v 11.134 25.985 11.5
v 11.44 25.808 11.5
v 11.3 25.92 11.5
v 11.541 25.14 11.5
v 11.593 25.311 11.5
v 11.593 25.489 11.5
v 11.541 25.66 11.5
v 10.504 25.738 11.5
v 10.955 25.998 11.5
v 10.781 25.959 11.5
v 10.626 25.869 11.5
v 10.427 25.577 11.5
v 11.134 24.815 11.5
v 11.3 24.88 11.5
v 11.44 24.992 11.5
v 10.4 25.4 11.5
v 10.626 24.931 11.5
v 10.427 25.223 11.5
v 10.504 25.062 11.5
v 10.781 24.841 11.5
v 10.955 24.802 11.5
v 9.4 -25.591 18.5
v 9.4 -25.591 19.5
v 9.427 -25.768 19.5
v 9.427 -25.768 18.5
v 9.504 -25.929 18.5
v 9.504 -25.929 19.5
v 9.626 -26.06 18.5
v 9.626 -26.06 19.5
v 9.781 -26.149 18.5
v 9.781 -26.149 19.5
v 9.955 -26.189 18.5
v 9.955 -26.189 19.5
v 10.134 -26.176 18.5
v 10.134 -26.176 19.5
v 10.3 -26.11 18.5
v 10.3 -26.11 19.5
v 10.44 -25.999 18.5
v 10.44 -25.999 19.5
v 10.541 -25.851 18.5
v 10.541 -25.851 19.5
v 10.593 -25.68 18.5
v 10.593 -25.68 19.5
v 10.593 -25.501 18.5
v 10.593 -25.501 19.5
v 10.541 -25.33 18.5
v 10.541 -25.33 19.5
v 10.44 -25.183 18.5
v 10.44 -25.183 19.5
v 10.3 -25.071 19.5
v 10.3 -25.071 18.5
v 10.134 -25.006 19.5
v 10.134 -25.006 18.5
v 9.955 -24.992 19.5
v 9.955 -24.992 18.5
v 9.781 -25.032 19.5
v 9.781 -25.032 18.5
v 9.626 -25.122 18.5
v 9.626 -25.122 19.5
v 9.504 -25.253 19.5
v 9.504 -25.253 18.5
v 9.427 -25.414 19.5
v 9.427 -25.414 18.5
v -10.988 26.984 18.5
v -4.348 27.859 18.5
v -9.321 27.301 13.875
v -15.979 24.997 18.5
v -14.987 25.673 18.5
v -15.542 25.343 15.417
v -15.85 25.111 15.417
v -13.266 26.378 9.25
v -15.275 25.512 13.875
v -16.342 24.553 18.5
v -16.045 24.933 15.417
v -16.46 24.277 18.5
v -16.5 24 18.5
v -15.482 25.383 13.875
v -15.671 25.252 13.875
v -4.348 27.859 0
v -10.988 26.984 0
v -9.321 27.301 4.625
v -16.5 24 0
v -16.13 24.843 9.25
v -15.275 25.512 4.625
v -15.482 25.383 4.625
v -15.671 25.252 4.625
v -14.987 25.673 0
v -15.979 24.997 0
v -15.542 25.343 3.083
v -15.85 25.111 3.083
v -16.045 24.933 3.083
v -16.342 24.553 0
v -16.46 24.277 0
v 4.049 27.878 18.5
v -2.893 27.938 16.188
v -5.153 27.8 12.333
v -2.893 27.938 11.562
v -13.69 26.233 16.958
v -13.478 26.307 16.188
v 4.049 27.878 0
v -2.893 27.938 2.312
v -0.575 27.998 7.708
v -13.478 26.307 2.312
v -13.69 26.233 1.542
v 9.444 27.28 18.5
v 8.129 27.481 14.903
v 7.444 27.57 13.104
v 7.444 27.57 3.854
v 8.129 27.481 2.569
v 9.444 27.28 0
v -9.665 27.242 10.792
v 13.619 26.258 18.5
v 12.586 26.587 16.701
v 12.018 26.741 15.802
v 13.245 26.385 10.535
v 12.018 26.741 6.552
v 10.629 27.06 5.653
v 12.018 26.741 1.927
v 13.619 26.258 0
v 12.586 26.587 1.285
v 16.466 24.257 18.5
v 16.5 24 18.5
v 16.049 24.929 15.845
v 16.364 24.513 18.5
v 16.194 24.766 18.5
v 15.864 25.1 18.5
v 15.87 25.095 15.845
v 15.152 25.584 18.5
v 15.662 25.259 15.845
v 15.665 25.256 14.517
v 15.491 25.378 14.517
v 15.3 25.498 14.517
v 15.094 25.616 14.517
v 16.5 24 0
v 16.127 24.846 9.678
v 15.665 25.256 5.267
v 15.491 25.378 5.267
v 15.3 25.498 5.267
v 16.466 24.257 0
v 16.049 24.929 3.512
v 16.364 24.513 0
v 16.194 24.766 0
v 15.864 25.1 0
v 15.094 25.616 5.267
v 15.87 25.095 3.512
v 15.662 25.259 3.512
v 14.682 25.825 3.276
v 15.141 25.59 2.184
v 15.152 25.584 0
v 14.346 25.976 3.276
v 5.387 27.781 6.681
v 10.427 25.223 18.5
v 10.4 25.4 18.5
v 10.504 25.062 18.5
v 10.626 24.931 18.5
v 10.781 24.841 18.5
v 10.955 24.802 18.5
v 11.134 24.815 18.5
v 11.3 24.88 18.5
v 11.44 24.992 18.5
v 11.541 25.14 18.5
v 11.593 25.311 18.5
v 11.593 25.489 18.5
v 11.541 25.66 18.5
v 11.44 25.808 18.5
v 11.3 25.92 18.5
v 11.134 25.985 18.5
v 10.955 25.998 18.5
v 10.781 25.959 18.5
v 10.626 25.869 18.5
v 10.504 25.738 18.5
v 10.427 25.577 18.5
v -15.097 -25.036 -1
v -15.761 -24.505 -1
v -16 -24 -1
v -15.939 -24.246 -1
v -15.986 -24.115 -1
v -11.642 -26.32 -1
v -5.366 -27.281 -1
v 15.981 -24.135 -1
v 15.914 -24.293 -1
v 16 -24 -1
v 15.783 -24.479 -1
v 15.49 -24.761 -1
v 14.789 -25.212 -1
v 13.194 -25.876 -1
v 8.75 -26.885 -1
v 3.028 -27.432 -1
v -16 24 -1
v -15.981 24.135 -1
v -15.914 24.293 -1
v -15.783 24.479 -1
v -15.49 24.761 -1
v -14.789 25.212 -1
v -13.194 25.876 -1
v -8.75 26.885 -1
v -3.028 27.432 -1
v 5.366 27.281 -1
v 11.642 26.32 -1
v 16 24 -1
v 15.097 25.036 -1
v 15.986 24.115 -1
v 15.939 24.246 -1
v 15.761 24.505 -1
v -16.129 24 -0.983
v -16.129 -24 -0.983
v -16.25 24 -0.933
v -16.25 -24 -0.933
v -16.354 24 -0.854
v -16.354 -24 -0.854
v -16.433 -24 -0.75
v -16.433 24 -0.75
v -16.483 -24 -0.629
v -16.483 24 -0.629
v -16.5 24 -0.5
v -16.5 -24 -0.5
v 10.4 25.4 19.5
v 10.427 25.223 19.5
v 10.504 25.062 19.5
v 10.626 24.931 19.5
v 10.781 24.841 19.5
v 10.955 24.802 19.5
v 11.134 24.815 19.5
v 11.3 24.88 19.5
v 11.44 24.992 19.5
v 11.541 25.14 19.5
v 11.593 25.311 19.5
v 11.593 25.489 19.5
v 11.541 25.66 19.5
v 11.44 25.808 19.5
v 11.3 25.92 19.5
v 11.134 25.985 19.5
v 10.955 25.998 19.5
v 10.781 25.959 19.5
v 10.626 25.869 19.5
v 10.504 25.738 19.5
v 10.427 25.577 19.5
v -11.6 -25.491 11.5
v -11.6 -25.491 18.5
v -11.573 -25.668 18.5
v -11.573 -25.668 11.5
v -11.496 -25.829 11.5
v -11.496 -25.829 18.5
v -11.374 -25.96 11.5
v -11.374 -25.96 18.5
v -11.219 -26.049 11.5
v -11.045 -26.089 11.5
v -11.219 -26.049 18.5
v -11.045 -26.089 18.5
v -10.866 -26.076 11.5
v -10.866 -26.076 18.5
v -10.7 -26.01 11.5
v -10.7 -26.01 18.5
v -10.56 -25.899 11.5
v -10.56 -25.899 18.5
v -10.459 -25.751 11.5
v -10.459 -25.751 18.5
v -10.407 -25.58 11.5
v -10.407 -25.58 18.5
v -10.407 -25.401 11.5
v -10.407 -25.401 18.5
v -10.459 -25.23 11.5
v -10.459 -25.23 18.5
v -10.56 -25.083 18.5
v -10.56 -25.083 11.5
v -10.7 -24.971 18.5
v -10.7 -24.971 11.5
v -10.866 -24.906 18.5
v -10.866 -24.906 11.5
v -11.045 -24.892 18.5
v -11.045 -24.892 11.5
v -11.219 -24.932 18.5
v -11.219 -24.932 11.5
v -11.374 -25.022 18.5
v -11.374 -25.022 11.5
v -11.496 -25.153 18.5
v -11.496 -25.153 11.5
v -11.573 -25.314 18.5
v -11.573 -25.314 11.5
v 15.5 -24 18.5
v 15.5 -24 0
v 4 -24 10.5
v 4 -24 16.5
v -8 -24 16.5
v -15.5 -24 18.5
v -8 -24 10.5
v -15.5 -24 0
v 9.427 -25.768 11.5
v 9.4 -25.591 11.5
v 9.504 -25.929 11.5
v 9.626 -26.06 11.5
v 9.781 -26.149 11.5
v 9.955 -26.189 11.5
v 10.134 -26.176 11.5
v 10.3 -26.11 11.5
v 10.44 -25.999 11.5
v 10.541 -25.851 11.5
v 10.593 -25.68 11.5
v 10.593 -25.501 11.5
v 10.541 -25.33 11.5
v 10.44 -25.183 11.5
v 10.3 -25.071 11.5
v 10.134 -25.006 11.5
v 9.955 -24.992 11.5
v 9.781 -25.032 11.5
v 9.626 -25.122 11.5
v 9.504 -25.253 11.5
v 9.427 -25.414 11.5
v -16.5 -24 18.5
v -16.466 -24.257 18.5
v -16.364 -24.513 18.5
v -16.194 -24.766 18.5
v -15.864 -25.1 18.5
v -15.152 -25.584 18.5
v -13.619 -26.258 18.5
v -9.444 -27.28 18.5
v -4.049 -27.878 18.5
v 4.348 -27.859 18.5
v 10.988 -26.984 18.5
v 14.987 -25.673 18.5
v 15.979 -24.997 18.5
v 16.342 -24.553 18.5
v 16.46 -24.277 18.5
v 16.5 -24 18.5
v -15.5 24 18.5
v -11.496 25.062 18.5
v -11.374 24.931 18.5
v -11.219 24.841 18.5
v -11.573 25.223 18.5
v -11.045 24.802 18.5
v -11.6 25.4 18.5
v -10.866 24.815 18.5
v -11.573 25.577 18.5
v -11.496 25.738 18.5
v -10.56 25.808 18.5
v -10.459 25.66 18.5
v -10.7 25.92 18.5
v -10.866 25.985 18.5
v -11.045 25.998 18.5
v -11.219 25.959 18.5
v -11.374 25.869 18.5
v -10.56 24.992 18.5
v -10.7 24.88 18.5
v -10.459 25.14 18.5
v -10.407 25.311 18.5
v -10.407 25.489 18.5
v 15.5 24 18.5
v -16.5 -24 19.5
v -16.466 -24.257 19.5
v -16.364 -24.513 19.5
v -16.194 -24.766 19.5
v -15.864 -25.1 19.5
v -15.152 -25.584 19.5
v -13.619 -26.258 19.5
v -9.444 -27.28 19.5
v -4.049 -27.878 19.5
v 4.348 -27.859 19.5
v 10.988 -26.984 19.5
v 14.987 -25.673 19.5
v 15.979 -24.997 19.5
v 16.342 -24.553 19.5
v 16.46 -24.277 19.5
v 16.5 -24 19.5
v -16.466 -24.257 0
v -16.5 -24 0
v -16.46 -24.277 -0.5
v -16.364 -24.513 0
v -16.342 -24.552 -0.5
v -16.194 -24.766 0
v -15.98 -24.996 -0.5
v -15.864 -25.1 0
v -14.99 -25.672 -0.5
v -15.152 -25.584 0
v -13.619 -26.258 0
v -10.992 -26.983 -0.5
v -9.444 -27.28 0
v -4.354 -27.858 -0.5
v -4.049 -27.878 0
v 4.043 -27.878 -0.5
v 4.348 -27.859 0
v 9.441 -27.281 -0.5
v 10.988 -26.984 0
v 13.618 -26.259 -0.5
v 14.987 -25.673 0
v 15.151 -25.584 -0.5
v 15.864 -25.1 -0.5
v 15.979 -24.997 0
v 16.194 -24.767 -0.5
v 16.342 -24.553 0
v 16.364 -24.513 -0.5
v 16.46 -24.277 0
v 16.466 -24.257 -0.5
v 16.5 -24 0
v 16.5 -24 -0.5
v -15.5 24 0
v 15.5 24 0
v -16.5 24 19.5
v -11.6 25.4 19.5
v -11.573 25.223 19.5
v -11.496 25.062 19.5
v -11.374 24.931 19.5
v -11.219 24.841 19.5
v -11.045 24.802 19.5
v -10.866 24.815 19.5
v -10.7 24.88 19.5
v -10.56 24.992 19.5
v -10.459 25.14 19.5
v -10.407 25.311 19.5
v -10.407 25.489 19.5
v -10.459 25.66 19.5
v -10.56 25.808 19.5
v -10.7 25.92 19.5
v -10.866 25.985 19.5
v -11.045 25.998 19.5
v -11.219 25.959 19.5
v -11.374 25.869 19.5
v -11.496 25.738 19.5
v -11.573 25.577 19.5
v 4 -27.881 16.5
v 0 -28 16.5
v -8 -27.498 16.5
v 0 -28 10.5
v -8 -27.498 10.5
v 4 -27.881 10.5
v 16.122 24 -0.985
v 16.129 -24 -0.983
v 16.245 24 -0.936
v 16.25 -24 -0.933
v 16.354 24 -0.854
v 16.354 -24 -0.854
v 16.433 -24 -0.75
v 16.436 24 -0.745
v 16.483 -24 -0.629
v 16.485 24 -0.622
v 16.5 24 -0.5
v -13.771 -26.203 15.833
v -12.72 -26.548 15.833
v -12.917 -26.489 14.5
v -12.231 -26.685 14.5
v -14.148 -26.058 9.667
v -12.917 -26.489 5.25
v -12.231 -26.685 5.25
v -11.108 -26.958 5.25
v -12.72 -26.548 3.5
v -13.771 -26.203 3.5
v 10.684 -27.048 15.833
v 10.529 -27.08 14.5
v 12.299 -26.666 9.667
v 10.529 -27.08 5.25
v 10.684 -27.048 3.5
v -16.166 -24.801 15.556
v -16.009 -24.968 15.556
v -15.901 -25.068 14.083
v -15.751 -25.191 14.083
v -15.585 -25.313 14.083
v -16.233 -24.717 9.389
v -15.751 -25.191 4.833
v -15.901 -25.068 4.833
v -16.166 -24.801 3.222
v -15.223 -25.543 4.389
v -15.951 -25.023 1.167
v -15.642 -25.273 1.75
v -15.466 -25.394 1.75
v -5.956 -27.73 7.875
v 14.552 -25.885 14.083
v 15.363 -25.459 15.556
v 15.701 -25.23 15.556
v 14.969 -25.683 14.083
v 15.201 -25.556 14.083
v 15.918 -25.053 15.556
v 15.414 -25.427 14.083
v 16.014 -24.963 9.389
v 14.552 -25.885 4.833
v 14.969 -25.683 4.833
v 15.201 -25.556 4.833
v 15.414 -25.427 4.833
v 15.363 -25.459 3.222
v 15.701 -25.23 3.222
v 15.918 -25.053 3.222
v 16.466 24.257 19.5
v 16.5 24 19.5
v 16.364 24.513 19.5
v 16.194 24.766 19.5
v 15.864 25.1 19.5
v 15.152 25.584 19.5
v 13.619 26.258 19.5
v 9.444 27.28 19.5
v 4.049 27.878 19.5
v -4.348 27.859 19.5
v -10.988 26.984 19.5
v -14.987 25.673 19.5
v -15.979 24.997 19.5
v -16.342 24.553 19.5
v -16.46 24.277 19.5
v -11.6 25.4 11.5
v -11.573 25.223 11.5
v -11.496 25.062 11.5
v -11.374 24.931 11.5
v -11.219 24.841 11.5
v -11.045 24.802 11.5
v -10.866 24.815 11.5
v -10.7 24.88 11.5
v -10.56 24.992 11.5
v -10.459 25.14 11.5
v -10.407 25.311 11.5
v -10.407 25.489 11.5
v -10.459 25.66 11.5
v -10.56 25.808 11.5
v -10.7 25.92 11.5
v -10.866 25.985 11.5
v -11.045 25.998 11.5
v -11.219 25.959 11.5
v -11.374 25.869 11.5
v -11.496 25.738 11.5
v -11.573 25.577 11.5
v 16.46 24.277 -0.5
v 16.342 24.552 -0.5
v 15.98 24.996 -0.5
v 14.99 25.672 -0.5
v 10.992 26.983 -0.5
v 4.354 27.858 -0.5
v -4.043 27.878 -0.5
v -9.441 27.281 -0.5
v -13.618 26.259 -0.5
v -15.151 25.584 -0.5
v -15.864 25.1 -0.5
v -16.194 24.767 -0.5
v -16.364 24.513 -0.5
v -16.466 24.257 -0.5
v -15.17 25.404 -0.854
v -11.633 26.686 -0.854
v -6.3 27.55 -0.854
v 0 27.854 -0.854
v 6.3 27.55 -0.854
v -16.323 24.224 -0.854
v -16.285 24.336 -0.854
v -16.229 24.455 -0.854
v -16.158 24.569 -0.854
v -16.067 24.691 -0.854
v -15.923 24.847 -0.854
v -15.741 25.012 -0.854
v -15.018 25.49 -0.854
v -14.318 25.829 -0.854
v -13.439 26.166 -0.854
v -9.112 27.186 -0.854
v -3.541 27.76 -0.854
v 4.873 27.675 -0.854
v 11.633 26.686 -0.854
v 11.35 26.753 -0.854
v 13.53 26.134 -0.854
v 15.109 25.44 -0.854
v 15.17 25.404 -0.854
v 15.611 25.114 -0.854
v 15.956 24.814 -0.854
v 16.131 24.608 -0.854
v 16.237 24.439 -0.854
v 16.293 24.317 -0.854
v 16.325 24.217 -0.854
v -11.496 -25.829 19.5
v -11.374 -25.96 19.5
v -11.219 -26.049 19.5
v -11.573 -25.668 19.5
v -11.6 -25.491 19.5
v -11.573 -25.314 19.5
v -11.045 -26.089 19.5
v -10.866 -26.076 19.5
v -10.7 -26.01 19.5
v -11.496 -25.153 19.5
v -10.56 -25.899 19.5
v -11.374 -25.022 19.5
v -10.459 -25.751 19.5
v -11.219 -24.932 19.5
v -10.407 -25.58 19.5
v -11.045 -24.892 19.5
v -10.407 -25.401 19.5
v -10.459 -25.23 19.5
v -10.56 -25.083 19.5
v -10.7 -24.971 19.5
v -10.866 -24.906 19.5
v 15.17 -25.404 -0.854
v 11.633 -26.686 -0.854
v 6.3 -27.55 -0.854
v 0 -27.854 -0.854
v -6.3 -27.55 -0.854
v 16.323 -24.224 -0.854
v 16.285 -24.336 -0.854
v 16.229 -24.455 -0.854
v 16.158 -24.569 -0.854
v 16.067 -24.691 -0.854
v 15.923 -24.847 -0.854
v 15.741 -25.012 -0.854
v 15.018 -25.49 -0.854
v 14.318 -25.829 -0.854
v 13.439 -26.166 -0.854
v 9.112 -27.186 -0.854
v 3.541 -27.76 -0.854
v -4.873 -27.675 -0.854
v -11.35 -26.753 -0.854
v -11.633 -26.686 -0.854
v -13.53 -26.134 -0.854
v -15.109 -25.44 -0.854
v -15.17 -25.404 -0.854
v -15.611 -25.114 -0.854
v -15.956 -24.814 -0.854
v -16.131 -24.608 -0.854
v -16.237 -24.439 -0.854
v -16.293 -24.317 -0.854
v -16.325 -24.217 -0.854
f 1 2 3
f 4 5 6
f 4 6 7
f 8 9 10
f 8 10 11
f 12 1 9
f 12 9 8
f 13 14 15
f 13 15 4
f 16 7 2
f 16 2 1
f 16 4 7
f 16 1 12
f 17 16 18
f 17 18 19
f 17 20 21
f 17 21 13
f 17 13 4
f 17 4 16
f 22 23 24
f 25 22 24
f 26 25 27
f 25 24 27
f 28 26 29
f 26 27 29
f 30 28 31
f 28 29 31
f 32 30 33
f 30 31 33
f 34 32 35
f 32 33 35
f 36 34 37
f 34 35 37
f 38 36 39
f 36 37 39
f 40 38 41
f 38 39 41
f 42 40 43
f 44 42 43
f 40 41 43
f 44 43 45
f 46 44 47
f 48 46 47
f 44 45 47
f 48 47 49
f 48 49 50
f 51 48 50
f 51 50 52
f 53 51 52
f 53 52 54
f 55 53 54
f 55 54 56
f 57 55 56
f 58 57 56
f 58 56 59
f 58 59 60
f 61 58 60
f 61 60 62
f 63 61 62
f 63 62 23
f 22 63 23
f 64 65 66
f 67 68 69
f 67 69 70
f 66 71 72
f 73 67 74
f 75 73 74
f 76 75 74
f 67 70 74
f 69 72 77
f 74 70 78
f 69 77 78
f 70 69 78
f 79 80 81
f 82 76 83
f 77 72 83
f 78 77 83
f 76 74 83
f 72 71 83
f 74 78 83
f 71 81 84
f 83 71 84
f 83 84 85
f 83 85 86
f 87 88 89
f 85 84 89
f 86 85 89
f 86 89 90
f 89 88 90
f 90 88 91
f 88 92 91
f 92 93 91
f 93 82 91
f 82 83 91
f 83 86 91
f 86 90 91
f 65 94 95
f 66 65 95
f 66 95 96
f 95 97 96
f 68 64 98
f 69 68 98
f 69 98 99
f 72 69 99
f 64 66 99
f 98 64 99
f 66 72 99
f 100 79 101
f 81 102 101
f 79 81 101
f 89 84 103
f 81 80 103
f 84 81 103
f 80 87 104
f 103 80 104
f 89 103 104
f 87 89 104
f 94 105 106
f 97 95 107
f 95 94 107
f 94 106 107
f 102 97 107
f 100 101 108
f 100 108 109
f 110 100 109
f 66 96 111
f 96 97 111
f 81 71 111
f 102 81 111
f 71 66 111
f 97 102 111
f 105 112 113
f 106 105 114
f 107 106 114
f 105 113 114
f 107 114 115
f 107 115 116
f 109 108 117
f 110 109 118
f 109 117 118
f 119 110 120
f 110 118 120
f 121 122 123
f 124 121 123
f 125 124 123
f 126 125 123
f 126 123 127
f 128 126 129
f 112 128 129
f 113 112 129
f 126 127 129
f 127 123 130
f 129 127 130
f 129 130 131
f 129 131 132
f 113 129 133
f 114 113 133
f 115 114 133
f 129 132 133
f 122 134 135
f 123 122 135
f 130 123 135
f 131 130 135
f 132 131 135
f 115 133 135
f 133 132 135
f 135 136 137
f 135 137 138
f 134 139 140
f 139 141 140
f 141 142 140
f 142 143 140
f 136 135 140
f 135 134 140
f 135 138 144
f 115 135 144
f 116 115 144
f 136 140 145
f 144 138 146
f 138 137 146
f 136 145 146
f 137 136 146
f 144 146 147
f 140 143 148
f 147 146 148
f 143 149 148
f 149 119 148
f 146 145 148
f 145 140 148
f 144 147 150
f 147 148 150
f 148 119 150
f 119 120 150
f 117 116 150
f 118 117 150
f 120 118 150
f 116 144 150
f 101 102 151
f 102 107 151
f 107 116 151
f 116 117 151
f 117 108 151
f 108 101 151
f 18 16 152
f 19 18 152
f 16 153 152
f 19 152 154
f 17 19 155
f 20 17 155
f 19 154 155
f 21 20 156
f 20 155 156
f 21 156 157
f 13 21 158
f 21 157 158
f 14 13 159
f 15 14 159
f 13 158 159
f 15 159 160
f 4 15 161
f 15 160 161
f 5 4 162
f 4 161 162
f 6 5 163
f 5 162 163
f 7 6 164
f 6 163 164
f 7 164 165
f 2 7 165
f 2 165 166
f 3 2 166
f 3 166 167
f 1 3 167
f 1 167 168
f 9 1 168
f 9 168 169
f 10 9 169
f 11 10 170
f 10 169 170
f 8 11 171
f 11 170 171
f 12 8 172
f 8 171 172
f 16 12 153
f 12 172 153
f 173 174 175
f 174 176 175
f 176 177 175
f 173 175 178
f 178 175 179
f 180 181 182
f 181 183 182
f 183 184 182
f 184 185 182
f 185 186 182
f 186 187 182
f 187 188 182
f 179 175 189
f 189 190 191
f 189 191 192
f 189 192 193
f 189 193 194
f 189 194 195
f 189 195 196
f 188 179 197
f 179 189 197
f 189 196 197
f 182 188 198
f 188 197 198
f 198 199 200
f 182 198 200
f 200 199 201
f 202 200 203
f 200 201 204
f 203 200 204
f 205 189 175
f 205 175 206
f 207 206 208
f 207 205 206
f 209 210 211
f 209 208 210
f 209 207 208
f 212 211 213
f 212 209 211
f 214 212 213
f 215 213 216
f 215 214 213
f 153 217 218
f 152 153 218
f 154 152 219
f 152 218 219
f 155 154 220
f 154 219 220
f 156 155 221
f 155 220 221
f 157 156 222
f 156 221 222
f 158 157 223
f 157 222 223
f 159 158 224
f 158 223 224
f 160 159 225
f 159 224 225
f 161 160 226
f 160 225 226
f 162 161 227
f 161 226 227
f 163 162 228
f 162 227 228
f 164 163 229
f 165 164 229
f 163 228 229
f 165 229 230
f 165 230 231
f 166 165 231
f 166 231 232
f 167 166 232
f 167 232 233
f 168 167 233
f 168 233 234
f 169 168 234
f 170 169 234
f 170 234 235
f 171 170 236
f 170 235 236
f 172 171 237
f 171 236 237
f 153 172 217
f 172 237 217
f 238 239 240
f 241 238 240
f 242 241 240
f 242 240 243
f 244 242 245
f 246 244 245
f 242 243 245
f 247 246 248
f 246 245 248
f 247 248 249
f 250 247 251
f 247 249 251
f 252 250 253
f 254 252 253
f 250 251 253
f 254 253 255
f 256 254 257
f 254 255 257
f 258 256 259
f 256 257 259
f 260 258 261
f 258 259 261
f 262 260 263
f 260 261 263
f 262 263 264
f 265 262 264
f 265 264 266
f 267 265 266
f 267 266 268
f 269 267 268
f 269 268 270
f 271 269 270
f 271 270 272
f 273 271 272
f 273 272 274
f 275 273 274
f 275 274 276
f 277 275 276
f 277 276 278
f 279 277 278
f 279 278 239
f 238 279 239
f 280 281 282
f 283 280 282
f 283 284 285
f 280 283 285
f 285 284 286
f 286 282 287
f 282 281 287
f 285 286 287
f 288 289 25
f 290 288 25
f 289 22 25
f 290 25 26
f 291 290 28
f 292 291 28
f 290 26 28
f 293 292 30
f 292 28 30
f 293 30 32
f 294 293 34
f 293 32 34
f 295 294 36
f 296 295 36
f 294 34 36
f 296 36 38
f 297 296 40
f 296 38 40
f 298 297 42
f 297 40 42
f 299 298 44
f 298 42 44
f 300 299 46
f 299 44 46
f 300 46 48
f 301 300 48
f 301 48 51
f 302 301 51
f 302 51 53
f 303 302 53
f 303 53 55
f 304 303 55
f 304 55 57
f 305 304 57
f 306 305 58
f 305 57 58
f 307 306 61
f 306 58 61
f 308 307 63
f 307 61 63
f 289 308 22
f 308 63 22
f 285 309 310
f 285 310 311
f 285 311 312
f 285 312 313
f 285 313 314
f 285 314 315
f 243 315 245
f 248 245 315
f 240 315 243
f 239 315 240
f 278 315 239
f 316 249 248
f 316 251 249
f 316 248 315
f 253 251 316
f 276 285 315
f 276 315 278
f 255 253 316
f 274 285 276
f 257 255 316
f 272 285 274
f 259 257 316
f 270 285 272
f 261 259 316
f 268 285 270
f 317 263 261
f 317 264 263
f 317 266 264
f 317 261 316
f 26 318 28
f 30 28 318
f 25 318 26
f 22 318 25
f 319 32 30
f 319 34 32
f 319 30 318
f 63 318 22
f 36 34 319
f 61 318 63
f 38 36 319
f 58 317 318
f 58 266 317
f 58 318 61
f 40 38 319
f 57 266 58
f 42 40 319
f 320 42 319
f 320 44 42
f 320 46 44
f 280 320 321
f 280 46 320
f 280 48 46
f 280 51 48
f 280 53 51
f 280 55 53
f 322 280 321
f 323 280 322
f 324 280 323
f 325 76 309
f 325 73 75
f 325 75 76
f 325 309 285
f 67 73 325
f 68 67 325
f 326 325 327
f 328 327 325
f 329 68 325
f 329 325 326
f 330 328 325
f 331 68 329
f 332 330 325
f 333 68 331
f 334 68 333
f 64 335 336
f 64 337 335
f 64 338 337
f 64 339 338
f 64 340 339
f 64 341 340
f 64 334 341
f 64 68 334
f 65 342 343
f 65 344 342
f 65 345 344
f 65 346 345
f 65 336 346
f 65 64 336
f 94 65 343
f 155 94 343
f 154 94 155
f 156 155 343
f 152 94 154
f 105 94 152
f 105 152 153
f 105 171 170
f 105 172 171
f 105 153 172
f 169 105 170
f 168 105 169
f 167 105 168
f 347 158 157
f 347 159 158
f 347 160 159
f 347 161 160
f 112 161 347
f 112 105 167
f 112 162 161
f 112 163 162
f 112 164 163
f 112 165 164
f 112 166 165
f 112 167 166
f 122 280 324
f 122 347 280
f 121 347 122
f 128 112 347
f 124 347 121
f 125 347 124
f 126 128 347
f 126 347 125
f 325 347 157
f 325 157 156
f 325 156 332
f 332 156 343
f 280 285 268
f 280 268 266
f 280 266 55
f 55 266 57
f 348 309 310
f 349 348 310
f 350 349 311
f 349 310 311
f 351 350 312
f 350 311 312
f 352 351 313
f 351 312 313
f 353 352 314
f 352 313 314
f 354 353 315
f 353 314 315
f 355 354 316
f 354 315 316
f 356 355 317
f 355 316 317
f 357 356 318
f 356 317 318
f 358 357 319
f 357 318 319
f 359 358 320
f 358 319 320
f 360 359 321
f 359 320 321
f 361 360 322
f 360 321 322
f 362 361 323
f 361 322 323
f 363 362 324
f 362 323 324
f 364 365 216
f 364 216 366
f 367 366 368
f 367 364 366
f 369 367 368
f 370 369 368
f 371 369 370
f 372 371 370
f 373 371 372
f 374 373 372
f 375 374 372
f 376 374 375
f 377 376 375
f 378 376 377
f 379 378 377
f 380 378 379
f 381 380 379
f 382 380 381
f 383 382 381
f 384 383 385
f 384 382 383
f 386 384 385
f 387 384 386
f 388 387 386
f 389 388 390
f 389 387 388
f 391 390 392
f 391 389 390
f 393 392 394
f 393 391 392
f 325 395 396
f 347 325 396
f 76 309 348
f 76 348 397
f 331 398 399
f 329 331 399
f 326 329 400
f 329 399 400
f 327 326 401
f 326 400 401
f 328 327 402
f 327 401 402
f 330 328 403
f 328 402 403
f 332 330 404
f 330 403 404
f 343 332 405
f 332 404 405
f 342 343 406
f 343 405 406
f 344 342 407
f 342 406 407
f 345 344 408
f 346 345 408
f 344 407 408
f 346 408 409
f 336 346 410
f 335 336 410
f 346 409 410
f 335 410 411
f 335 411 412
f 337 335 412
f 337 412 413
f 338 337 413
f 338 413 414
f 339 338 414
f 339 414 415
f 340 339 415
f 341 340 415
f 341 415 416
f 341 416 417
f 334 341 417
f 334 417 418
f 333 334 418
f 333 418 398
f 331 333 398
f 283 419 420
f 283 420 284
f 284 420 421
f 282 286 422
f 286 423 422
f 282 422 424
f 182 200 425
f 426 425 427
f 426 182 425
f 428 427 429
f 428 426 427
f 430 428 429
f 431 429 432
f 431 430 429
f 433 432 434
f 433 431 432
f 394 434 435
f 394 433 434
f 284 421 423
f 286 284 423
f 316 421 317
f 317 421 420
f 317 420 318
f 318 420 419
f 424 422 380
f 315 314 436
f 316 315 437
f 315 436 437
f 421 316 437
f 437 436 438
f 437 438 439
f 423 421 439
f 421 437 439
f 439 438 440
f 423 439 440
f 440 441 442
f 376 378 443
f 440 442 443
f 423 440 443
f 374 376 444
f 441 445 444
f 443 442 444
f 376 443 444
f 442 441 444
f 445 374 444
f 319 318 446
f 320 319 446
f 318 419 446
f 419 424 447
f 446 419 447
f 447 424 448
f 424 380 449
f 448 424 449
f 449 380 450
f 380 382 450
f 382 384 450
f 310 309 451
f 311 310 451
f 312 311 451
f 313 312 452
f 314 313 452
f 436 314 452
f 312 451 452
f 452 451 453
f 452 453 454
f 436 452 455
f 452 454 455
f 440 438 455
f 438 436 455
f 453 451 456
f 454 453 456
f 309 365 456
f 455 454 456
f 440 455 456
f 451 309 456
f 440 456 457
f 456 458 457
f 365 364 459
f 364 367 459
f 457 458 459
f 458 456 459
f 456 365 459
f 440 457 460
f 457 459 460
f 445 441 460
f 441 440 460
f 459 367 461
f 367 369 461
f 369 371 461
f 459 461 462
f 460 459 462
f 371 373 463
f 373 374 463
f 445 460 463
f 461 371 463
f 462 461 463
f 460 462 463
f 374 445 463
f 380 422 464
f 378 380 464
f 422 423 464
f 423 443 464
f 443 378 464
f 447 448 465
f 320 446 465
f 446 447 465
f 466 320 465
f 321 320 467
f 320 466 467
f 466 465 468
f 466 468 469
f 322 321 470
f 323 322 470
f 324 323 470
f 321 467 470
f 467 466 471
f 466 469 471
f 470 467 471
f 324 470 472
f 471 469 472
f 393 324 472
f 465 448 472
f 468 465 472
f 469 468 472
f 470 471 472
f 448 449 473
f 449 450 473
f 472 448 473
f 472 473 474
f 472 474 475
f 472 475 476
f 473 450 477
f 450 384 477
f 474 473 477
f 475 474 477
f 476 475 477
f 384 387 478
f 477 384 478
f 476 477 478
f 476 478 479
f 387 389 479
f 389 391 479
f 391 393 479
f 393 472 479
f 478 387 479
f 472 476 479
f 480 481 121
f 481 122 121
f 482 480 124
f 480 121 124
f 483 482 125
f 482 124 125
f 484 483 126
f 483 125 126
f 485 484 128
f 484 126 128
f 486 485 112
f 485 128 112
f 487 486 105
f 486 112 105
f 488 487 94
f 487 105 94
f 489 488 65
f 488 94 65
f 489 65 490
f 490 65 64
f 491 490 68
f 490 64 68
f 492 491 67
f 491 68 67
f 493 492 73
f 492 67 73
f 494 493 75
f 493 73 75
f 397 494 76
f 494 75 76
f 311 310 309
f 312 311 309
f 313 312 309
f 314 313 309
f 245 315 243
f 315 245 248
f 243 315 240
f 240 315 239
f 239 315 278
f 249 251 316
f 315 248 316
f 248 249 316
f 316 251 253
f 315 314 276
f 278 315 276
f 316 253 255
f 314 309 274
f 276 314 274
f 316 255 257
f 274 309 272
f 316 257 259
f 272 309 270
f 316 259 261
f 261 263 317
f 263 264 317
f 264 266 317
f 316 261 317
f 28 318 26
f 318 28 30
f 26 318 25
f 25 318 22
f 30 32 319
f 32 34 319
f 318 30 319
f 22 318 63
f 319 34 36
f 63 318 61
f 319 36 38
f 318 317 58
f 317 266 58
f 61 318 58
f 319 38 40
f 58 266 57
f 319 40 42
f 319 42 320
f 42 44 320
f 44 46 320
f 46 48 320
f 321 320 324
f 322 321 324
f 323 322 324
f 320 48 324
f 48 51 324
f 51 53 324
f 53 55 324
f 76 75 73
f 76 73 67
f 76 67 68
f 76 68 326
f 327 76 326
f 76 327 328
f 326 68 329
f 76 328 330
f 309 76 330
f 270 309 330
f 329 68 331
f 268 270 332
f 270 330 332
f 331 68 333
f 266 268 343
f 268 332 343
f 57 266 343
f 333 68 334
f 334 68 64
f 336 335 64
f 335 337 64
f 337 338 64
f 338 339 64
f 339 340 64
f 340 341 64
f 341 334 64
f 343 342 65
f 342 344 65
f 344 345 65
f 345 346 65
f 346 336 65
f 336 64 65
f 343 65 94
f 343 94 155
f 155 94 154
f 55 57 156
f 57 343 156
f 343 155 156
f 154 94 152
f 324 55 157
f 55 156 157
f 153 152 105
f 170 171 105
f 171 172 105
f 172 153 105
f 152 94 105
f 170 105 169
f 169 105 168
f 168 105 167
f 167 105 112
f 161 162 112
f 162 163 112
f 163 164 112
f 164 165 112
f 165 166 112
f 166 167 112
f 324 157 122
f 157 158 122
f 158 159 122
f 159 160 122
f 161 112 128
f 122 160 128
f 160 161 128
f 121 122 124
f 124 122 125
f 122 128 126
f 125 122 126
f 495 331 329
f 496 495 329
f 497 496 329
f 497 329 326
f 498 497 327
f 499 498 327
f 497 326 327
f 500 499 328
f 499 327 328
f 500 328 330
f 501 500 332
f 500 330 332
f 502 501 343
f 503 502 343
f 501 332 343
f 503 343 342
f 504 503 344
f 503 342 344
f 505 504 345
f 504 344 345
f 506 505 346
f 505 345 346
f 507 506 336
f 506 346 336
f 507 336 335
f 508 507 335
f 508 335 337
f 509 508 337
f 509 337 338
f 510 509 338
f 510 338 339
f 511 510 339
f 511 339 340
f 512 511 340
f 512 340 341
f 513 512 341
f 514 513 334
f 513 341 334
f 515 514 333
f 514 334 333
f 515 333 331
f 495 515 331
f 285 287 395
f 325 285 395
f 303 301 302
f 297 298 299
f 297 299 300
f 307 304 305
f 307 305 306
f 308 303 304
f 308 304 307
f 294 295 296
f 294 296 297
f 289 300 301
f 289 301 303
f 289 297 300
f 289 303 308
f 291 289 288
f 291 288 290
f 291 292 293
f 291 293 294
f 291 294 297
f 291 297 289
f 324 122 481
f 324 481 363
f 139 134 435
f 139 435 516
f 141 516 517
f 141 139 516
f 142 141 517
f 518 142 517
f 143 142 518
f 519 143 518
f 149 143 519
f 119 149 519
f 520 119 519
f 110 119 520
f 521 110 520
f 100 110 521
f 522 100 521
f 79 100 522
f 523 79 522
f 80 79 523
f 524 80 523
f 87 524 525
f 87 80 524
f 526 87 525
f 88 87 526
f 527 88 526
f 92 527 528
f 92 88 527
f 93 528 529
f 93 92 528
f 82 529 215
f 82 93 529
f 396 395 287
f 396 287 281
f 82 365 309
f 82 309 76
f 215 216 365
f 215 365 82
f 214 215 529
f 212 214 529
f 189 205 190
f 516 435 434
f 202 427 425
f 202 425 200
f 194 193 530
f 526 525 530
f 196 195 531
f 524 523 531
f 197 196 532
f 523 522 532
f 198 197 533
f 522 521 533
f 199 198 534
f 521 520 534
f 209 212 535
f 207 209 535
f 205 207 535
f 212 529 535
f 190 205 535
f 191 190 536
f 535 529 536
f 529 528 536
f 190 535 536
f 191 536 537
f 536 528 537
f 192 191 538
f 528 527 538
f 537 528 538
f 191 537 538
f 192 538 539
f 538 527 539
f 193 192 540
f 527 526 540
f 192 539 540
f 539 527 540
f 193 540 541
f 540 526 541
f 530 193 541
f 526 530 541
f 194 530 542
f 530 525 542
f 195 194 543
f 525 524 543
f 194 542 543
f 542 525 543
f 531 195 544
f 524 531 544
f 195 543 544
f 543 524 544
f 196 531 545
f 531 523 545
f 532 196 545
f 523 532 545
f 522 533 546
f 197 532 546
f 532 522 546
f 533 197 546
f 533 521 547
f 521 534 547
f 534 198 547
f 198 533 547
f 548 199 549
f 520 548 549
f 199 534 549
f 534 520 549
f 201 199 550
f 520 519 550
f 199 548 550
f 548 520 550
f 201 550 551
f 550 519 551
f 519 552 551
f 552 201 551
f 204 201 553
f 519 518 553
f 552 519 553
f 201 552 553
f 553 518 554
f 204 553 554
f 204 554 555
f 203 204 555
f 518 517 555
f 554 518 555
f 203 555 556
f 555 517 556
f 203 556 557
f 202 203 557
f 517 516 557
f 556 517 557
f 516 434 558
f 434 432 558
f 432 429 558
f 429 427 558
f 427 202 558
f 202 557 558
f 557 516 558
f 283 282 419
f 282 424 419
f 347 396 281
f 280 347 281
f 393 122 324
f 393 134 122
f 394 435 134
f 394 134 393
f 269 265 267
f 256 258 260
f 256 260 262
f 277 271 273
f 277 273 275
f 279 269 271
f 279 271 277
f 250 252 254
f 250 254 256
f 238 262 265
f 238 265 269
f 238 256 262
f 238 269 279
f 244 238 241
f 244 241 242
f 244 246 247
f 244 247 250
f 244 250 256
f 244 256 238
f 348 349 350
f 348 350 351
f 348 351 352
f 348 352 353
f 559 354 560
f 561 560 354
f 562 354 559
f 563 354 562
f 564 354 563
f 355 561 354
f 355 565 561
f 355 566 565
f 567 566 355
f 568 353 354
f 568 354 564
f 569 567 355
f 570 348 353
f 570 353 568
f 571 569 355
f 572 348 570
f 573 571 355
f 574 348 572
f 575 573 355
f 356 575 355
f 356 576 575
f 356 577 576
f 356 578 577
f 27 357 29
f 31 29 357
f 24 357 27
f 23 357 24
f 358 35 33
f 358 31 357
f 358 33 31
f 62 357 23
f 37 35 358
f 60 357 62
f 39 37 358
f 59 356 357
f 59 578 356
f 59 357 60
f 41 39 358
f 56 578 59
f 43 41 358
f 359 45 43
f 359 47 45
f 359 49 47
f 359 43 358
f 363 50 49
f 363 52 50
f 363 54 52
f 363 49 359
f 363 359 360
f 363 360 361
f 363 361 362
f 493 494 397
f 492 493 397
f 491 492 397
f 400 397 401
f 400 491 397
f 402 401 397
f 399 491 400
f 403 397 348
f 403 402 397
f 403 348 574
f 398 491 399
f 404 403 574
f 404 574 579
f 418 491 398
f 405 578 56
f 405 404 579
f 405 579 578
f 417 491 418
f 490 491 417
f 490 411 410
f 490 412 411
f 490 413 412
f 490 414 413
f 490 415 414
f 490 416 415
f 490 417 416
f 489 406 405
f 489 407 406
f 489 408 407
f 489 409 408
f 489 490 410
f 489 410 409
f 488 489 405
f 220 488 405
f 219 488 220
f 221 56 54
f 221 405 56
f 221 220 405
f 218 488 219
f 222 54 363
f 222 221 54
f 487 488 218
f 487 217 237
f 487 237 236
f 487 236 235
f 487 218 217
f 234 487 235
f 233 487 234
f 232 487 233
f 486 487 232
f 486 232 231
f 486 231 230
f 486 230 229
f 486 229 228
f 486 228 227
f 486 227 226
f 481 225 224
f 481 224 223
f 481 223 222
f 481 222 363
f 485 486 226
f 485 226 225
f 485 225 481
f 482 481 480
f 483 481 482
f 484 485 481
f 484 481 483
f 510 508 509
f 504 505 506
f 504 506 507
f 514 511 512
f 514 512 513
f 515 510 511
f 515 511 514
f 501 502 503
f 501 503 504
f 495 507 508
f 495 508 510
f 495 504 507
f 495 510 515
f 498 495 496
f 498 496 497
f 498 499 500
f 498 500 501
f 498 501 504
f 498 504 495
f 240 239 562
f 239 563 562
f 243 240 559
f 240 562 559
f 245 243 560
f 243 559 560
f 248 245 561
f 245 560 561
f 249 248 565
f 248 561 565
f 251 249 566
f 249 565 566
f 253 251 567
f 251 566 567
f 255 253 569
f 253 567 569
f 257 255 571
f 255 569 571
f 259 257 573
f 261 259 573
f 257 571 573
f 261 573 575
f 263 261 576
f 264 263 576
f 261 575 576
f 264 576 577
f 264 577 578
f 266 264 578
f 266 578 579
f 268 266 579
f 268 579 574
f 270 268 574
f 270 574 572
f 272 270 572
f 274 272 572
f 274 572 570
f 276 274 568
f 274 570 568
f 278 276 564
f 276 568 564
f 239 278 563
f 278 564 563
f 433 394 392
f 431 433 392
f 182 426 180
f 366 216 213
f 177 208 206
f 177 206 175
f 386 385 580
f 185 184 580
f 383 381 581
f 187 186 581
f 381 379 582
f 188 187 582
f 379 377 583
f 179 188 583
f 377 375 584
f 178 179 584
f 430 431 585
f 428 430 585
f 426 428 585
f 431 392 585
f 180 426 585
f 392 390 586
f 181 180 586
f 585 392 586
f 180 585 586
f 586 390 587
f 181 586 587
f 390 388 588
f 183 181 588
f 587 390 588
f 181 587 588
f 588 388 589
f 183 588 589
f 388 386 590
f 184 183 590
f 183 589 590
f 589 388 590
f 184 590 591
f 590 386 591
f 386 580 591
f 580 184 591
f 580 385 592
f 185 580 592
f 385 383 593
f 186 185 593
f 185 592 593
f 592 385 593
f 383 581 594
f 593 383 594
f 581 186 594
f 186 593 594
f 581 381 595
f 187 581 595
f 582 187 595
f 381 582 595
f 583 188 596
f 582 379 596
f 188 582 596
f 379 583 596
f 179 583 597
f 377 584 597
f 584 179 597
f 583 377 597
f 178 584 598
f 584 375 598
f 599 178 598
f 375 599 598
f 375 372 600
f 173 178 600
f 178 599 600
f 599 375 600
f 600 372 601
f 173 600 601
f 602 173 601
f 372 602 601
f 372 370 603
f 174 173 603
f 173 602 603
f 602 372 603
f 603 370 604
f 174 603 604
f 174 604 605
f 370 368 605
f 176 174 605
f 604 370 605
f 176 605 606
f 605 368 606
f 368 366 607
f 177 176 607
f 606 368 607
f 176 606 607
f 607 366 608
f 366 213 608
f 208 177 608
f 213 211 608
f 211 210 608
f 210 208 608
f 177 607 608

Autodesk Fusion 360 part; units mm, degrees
sketch "Boceto1" plane through (0, 0, 0) normal (0, 0, 1) x (1, 0, 0)
  line L0 (15.5, -24) -> (-15.5, -24)
  line L1 (-15.5, -24) -> (-15.5, 24)
  line L2 (-15.5, 24) -> (15.5, 24)
  line L3 (15.5, 24) -> (15.5, -24)
  line L4 (15.5, -24) -> (-15.5, 24) construction
  line L5 (-15.5, -24) -> (15.5, 24) construction
  line L6 (-16.5, -24) -> (-16.5, 24)
  line L7 (16.5, 24) -> (16.5, -24)
  line L8 (16.5, -25) -> (-16.2747, 24.6587) construction
  line L9 (-16.5, -25) -> (16.2747, 24.6587) construction
  ellipse E0 centre (0, 24) end of major axis (16.5, 24) minor radius 4 (16.5, 24) -> (-16.5, 24) ccw
  ellipse E1 centre (0, -24) end of major axis (16.5, -24) minor radius 4 (-16.5, -24) -> (16.5, -24) ccw
  dimension "d1" = 31
  dimension "d2" = 48
  dimension "d6" = 8
extrude "Extruir1" add sketch "Boceto1" against normal blind 1 contours L0 L1 L2 L3 | L6 L7 E0 E1 makes body 1
extrude "Extruir2" add sketch "Boceto1" along normal blind 0.8 from surface at 30 separate body contours L0 L1 L2 L3 makes body 2
extrude "Extruir3" add sketch "Boceto1" along normal blind 18.5 bodies 1
extrude "Extruir4" add sketch "Boceto1" along normal blind 1 from surface at 18.5 separate body contours L0 L1 L2 L3 | L6 L7 E0 E1 makes body 3
ref_plane "PlanoDeObra1" through (0, -28, 0) normal (0, 1, 0) x (0, 0, 1)
sketch "Boceto4" plane through (0, -28, 0) normal (0, 1, 0) x (1, 0, 0)
  line L0 (-16.5, -18.5) -> (-16.5, 1)
  line L1 (16.5, 1) -> (-16.5, 1)
  line L2 (16.5, 1) -> (16.5, -18.5)
  line L3 (-16.5, -18.5) -> (16.5, -18.5)
  line L4 (-16.5, -18.5) -> (16.5, -18.5)
  line L5 (16.5, -18.5) -> (16.5, -19.5)
  line L6 (-16.5, -19.5) -> (16.5, -19.5)
  line L7 (-16.5, -19.5) -> (-16.5, -18.5)
  line L8 (0, -19.5) -> (-14, -19.5) construction
  line L9 (-14, -19.5) -> (-14, -12.5) construction
  line L10 (-14, -12.5) -> (0, -12.5) construction
  line L11 (0, -19.5) -> (0, -12.5) construction
  line L12 (-14, -12.5) -> (-14, -10.5) construction
  line L13 (-14, -10.5) -> (-8, -10.5) construction
  line L14 (-8, -10.5) -> (4, -10.5)
  line L15 (4, -10.5) -> (4, -16.5)
  line L16 (4, -16.5) -> (-8, -16.5)
  line L17 (-8, -16.5) -> (-8, -10.5)
  dimension "d18" = 14
  dimension "d19" = 7
  dimension "d20" = 14
  dimension "d40" = 2
  dimension "d41" = 6
  dimension "d43" = 12
  dimension "d44" = 6
extrude "Extruir5" cut sketch "Boceto4" along normal blind 6 contours L14 L15 L16 L17 bodies 1
fillet "Empalme1" radius 0.5 4 edges at (-16.5, 0, -1) (0, 28, -1) (16.5, 0, -1) (0, -28, -1) on bodies 1
sketch "Boceto6" plane through (0, 0, 19.5) normal (0, 0, 1) x (-1, 0, 0)
  line L0 (-16.5, 24) -> (-16.5, -24)
  ellipse E0 centre (0, -24) end of major axis (-16.5, -24) minor radius 4 (-16.5, -24) -> (16.5, -24) ccw
  line L1 (16.5, -24) -> (16.5, 24)
  ellipse E1 centre (0, 24) end of major axis (-16.5, 24) minor radius 4 (16.5, 24) -> (-16.5, 24) ccw
  line L2 (15.5, -24) -> (-15.5, -24)
  line L3 (-15.5, 24) -> (15.5, 24)
  line L4 (0, -24) -> (0, -28) construction
  line L5 (0, -25.073) -> (11, -25.073) construction
  line L6 (0, -25.073) -> (-11, -25.073) construction
  line L7 (-11, -25.073) -> (-11, -24) construction
  line L8 (11, -25.073) -> (11, -24) construction
  line L9 (-11, -24) -> (-11, -25.4)
  circle A0 centre (-11, -25.4) radius 0.6
  line L10 (11, -24) -> (11, -25.4) construction
  circle A1 centre (11, -25.4) radius 0.6
  line L11 (0, 24) -> (-10, 24) construction
  line L12 (-10, 24) -> (-10, 27.1817) construction
  line L13 (0, 24) -> (11, 24) construction
  line L14 (11, 24) -> (11, 26.9814) construction
  circle A2 centre (11, 25.4907) radius 0.6
  circle A3 centre (-10, 25.5908) radius 0.6
  dimension "d31" = 11
  dimension "d32" = 11
  dimension "d34" = 1.4
  dimension "d35" = 1.2
  dimension "d36" = 1.4
  dimension "d37" = 1.2
  dimension "d46" = 10
  dimension "d47" = 11
  dimension "d48" = 1.2
  dimension "d49" = 1.2
extrude "Extruir7" cut sketch "Boceto6" against normal blind 8 contours A0 | A1 | A2 | A3 bodies 1 3
hidden bodies 2
equation "d12 = 12 mm + 6.5 mm"
